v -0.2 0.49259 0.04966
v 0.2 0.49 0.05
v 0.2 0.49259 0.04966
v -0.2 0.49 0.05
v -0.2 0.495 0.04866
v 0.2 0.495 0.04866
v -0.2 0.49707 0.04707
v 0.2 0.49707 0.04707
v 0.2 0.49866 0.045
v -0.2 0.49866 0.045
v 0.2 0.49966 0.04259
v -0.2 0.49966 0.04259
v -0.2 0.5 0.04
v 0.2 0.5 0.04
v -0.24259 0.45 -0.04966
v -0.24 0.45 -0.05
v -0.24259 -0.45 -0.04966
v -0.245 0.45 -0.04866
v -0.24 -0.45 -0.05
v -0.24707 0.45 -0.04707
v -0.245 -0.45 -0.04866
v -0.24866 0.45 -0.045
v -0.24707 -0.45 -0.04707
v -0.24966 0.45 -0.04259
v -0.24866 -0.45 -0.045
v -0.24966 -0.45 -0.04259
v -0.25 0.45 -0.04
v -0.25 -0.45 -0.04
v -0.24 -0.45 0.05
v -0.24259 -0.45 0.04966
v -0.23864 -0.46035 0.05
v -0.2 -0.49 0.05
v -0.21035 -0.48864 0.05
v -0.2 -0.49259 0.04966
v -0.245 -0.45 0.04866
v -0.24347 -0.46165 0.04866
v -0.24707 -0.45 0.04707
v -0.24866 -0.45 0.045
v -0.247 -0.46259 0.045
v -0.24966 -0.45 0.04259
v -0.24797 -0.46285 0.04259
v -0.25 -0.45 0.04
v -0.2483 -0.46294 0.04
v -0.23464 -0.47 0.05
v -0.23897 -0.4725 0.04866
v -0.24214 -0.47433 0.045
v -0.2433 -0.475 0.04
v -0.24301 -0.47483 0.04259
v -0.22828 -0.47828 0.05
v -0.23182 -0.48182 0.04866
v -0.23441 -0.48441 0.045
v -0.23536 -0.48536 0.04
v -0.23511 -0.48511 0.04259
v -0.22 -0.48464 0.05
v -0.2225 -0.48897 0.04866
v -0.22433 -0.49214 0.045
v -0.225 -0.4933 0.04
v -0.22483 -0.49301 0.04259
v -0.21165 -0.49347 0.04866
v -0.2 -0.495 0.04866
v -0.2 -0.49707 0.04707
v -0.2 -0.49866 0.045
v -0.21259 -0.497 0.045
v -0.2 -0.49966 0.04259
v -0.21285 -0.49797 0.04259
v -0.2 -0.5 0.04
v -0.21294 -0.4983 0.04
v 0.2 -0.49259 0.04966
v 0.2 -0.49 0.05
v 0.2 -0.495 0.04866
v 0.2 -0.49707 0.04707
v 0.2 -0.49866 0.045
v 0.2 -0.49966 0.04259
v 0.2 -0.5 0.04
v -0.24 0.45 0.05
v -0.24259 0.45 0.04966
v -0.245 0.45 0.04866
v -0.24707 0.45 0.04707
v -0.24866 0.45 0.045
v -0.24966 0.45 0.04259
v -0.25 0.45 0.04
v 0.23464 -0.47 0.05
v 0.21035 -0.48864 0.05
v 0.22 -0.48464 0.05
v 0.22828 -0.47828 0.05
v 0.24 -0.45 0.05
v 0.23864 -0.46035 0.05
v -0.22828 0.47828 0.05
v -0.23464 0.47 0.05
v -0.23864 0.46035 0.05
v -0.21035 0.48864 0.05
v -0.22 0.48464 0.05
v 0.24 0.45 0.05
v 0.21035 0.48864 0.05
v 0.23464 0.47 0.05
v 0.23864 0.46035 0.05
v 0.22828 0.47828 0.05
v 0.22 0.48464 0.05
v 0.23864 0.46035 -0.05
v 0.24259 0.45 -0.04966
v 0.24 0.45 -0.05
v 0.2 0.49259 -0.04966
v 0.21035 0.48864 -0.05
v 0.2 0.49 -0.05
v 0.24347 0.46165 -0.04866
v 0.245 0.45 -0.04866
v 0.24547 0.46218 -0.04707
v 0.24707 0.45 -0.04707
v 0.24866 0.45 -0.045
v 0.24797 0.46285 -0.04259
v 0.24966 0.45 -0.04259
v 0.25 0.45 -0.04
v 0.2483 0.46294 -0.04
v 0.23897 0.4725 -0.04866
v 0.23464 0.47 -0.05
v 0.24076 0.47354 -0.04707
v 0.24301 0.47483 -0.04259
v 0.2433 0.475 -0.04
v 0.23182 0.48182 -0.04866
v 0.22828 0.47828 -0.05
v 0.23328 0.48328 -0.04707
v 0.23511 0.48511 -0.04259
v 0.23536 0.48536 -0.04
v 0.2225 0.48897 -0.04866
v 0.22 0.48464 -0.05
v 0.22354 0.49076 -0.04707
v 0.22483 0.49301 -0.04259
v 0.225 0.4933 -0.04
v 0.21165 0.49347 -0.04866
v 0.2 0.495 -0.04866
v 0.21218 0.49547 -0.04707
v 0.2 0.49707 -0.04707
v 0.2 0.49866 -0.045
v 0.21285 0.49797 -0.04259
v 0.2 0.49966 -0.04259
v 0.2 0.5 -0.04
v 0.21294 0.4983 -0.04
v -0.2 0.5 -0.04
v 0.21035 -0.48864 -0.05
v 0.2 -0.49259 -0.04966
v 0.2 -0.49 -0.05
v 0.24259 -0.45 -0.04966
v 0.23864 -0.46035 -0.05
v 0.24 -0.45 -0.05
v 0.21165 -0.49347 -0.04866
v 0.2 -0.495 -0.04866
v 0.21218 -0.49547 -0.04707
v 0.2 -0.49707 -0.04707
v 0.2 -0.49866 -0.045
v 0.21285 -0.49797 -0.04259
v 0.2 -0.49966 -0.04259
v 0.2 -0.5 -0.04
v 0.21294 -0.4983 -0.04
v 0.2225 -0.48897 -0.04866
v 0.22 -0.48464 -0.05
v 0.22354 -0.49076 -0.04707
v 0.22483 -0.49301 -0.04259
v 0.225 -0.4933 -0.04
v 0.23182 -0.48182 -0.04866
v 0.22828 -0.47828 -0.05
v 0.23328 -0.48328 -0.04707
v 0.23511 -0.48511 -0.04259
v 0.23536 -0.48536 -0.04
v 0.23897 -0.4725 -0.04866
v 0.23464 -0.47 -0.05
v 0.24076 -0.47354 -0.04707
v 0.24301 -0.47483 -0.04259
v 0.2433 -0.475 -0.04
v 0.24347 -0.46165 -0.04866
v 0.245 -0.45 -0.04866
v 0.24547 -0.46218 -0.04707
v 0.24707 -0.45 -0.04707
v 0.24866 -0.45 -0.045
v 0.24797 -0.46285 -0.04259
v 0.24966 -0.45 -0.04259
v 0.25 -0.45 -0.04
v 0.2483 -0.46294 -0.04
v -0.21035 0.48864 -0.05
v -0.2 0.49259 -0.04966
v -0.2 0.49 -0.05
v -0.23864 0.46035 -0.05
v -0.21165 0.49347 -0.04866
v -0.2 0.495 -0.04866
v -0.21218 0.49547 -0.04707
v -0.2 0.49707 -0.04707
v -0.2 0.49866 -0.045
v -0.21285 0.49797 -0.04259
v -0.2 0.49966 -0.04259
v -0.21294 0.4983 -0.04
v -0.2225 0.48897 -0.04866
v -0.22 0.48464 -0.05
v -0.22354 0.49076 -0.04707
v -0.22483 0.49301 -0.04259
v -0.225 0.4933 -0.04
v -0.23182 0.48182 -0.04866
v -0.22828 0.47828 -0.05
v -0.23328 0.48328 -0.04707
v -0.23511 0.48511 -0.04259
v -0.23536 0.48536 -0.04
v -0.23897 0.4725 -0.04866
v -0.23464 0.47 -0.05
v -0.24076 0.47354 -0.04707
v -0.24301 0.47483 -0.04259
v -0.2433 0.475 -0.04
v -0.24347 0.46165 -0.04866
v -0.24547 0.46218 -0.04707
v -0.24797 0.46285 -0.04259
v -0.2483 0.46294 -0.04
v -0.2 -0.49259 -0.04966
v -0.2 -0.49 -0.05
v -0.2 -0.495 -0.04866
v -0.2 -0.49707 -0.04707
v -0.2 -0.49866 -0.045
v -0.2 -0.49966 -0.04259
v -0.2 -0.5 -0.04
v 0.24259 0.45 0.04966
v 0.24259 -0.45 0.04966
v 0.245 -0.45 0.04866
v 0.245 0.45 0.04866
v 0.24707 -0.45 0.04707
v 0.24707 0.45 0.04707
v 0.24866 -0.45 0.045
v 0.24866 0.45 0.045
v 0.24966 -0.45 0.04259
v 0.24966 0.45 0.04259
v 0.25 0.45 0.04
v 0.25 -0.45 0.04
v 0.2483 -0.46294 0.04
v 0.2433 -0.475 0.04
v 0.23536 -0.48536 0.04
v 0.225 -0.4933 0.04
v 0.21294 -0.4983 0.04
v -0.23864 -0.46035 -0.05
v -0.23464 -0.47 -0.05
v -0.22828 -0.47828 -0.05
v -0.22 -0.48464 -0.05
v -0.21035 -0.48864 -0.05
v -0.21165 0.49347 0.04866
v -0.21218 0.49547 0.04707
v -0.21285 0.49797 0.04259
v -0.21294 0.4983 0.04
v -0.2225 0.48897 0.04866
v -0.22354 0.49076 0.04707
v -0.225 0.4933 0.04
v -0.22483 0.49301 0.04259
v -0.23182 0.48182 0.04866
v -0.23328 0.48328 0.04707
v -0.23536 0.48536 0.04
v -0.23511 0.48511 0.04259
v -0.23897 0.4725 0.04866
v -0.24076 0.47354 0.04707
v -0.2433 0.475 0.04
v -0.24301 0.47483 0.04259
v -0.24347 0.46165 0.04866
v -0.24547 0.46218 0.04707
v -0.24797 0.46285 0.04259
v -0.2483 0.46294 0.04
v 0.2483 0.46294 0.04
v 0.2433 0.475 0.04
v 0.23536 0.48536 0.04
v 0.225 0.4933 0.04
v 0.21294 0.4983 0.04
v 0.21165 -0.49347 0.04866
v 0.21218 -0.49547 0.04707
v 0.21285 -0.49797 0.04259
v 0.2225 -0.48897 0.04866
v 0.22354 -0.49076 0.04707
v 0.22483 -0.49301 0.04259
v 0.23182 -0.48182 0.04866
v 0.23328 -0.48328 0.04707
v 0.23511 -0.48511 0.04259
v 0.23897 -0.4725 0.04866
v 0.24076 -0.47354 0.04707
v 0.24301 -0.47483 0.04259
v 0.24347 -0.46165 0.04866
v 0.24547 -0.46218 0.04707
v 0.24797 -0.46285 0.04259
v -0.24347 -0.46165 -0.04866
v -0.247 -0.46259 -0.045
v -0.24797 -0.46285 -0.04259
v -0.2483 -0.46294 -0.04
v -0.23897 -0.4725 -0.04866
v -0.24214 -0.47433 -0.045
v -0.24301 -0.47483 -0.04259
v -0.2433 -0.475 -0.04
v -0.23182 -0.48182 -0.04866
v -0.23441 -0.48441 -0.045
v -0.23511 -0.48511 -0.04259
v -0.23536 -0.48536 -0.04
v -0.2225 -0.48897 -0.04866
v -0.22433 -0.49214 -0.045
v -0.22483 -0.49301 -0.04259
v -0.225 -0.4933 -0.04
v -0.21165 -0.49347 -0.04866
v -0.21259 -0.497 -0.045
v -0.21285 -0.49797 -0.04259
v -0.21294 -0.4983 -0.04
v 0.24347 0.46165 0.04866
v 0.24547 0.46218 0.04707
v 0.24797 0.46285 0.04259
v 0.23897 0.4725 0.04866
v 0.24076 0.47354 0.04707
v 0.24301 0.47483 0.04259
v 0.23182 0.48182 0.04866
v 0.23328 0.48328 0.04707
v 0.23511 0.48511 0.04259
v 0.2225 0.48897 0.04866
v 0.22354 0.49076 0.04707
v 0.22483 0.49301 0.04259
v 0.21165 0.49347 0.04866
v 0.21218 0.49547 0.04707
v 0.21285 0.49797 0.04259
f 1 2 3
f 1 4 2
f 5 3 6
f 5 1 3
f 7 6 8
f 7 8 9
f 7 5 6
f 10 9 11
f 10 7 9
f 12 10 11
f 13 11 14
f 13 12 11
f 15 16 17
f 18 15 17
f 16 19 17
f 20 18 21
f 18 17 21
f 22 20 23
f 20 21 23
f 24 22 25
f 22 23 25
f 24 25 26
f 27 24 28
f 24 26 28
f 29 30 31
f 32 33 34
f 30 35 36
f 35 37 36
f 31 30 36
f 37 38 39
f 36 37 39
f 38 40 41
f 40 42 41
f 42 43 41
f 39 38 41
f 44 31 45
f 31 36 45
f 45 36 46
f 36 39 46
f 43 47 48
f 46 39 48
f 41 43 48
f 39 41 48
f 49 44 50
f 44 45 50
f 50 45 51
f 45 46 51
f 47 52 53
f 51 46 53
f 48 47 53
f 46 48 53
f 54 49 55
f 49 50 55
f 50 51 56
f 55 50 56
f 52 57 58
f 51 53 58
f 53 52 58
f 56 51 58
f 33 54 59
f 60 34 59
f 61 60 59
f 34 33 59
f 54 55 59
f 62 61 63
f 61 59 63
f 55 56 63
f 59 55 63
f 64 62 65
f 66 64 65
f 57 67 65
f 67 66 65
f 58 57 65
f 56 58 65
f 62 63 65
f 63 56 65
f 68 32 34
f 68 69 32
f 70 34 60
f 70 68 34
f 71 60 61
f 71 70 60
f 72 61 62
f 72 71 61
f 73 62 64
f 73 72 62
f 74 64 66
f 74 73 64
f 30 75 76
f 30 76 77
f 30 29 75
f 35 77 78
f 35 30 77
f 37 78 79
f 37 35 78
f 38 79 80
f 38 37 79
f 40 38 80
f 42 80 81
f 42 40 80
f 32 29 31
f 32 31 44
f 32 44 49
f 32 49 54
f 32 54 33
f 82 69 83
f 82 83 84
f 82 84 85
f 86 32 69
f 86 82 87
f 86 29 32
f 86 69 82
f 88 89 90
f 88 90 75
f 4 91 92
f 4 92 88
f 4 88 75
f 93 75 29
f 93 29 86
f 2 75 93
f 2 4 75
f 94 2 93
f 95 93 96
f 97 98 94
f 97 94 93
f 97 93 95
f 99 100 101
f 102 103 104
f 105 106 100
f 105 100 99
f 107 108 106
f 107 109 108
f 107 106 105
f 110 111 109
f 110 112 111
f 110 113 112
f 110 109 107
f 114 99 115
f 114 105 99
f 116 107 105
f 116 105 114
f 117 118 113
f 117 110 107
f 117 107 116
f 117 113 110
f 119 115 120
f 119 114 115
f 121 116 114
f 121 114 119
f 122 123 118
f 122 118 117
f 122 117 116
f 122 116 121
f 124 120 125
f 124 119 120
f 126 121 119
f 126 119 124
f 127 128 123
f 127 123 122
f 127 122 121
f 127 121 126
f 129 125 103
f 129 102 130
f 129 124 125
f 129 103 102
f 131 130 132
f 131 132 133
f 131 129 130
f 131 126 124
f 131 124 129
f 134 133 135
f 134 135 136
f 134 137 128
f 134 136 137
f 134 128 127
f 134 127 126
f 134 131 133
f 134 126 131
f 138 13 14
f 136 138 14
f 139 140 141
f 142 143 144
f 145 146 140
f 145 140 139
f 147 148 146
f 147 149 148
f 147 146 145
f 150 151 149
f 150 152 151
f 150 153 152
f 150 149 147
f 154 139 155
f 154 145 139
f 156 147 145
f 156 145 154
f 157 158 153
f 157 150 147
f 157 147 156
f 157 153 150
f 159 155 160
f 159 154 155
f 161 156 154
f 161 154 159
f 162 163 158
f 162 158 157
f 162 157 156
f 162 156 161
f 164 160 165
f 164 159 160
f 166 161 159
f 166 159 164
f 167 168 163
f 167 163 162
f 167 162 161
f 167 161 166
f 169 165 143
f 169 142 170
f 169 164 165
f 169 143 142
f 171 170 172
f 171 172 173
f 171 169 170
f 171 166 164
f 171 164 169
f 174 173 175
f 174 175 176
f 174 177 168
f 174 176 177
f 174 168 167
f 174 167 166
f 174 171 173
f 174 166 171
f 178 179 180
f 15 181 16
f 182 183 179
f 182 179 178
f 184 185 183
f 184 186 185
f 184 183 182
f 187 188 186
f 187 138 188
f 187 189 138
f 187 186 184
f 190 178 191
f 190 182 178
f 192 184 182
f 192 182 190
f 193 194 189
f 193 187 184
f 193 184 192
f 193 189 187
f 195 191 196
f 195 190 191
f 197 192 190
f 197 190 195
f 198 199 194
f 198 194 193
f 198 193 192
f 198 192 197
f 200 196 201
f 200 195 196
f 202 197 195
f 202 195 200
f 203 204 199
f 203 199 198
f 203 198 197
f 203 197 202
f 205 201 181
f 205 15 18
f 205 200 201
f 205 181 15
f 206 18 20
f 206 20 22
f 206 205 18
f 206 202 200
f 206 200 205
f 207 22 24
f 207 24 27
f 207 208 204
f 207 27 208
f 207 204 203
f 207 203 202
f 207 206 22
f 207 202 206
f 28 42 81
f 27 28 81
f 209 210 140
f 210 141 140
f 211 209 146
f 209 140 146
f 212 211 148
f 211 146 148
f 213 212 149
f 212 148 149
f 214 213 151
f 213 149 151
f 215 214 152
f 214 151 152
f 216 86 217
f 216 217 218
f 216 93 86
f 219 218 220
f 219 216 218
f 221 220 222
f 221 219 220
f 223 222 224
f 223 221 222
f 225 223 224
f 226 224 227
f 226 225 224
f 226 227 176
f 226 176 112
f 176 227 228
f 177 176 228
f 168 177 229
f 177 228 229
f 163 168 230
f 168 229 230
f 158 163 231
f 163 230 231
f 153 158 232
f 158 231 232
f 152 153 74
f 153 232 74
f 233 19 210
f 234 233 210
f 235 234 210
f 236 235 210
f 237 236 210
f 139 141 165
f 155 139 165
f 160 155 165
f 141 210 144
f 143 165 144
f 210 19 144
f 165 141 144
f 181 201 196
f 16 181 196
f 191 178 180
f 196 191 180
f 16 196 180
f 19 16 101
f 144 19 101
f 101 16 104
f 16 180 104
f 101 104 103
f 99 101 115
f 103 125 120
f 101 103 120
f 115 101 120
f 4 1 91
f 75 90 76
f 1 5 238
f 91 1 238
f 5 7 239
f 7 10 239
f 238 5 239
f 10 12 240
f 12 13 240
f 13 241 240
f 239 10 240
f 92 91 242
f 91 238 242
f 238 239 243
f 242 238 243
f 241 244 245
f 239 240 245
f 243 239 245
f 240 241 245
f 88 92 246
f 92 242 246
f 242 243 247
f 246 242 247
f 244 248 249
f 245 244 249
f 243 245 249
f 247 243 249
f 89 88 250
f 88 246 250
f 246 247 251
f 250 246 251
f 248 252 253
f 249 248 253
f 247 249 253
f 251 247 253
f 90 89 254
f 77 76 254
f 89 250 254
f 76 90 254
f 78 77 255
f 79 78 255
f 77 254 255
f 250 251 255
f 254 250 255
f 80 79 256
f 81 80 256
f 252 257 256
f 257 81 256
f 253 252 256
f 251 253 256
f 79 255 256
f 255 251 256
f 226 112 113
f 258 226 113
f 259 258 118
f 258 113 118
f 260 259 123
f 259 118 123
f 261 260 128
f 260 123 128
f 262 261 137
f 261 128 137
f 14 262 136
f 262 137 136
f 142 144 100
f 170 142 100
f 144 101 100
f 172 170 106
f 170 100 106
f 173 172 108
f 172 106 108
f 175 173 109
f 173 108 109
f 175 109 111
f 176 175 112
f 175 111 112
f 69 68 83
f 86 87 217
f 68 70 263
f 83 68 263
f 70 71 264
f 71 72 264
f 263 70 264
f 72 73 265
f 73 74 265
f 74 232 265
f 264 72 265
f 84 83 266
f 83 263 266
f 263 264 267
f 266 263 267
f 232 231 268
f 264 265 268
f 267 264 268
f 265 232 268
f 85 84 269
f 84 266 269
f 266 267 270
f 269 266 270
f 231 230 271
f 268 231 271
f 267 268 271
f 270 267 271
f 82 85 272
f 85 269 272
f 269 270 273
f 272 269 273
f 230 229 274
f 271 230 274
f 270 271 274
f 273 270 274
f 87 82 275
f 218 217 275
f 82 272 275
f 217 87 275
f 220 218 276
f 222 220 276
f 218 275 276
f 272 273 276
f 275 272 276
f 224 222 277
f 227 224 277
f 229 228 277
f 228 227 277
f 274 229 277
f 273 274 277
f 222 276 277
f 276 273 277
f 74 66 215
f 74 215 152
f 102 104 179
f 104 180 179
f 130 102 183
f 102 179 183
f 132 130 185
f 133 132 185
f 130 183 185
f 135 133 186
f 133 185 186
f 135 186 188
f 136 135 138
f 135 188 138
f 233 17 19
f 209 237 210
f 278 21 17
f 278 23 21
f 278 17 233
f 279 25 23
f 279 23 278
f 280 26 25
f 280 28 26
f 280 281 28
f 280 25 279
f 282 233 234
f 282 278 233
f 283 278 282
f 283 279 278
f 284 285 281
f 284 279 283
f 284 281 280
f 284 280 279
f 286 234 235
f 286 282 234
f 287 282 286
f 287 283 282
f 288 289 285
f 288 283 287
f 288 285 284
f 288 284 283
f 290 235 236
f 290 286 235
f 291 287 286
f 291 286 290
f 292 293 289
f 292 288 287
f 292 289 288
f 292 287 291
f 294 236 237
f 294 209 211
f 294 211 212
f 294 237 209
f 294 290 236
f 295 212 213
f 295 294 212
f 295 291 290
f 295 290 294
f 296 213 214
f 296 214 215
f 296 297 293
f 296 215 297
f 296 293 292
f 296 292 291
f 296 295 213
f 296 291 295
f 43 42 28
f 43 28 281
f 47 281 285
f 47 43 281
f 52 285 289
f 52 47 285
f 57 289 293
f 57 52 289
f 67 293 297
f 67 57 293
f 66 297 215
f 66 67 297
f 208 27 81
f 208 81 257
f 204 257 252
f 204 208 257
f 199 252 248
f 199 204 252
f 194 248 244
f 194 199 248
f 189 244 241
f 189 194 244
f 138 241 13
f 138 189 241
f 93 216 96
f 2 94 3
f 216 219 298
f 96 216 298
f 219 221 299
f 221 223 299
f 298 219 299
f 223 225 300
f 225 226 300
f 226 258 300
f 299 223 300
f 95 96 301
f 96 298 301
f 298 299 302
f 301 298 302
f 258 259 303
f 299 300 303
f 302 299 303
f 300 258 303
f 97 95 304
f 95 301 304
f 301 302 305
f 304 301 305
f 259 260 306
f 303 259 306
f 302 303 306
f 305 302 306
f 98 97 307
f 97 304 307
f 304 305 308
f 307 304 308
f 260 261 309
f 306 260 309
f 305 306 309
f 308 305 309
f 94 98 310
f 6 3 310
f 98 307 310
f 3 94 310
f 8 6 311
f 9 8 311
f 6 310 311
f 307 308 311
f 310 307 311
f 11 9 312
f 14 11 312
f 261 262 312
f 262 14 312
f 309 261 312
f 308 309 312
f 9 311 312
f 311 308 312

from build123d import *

# Parameters (mm, degrees)
CROQUIS1_W              = 0.5
CROQUIS1_H              = 1
SALIENTE_EXTRUIR1_DEPTH = 0.05
REDONDEO3_R             = 0.05
REDONDEO4_R             = 0.01


with BuildPart() as part:
    # Croquis1 → Saliente-Extruir1 (new, symmetric)
    with BuildSketch(Plane.XY):
        Rectangle(CROQUIS1_W, CROQUIS1_H)
    extrude(amount=SALIENTE_EXTRUIR1_DEPTH, both=True)

    # Redondeo3
    redondeo3_edges = [part.edges().sort_by_distance(p)[0] for p in [
        (-0.25, 0.5, 0),
        (0.25, 0.5, 0),
        (0.25, -0.5, 0),
        (-0.25, -0.5, 0),
    ]]
    fillet(redondeo3_edges, radius=REDONDEO3_R)

    # Redondeo4
    redondeo4_edges = [part.edges().sort_by_distance(p)[0] for p in [
        (0, -0.5, -0.05),
        (0, -0.5, 0.05),
        (-0.25, 0, -0.05),
        (0, 0.5, -0.05),
        (0.25, 0, -0.05),
        (0.235355339, 0.485355339, -0.05),
        (-0.235355339, 0.485355339, -0.05),
        (0.235355339, -0.485355339, -0.05),
        (-0.235355339, -0.485355339, -0.05),
        (-0.25, 0, 0.05),
        (0.25, 0, 0.05),
        (0, 0.5, 0.05),
        (0.235355339, 0.485355339, 0.05),
        (-0.235355339, 0.485355339, 0.05),
        (0.235355339, -0.485355339, 0.05),
        (-0.235355339, -0.485355339, 0.05),
    ]]
    fillet(redondeo4_edges, radius=REDONDEO4_R)


solid = part.part
